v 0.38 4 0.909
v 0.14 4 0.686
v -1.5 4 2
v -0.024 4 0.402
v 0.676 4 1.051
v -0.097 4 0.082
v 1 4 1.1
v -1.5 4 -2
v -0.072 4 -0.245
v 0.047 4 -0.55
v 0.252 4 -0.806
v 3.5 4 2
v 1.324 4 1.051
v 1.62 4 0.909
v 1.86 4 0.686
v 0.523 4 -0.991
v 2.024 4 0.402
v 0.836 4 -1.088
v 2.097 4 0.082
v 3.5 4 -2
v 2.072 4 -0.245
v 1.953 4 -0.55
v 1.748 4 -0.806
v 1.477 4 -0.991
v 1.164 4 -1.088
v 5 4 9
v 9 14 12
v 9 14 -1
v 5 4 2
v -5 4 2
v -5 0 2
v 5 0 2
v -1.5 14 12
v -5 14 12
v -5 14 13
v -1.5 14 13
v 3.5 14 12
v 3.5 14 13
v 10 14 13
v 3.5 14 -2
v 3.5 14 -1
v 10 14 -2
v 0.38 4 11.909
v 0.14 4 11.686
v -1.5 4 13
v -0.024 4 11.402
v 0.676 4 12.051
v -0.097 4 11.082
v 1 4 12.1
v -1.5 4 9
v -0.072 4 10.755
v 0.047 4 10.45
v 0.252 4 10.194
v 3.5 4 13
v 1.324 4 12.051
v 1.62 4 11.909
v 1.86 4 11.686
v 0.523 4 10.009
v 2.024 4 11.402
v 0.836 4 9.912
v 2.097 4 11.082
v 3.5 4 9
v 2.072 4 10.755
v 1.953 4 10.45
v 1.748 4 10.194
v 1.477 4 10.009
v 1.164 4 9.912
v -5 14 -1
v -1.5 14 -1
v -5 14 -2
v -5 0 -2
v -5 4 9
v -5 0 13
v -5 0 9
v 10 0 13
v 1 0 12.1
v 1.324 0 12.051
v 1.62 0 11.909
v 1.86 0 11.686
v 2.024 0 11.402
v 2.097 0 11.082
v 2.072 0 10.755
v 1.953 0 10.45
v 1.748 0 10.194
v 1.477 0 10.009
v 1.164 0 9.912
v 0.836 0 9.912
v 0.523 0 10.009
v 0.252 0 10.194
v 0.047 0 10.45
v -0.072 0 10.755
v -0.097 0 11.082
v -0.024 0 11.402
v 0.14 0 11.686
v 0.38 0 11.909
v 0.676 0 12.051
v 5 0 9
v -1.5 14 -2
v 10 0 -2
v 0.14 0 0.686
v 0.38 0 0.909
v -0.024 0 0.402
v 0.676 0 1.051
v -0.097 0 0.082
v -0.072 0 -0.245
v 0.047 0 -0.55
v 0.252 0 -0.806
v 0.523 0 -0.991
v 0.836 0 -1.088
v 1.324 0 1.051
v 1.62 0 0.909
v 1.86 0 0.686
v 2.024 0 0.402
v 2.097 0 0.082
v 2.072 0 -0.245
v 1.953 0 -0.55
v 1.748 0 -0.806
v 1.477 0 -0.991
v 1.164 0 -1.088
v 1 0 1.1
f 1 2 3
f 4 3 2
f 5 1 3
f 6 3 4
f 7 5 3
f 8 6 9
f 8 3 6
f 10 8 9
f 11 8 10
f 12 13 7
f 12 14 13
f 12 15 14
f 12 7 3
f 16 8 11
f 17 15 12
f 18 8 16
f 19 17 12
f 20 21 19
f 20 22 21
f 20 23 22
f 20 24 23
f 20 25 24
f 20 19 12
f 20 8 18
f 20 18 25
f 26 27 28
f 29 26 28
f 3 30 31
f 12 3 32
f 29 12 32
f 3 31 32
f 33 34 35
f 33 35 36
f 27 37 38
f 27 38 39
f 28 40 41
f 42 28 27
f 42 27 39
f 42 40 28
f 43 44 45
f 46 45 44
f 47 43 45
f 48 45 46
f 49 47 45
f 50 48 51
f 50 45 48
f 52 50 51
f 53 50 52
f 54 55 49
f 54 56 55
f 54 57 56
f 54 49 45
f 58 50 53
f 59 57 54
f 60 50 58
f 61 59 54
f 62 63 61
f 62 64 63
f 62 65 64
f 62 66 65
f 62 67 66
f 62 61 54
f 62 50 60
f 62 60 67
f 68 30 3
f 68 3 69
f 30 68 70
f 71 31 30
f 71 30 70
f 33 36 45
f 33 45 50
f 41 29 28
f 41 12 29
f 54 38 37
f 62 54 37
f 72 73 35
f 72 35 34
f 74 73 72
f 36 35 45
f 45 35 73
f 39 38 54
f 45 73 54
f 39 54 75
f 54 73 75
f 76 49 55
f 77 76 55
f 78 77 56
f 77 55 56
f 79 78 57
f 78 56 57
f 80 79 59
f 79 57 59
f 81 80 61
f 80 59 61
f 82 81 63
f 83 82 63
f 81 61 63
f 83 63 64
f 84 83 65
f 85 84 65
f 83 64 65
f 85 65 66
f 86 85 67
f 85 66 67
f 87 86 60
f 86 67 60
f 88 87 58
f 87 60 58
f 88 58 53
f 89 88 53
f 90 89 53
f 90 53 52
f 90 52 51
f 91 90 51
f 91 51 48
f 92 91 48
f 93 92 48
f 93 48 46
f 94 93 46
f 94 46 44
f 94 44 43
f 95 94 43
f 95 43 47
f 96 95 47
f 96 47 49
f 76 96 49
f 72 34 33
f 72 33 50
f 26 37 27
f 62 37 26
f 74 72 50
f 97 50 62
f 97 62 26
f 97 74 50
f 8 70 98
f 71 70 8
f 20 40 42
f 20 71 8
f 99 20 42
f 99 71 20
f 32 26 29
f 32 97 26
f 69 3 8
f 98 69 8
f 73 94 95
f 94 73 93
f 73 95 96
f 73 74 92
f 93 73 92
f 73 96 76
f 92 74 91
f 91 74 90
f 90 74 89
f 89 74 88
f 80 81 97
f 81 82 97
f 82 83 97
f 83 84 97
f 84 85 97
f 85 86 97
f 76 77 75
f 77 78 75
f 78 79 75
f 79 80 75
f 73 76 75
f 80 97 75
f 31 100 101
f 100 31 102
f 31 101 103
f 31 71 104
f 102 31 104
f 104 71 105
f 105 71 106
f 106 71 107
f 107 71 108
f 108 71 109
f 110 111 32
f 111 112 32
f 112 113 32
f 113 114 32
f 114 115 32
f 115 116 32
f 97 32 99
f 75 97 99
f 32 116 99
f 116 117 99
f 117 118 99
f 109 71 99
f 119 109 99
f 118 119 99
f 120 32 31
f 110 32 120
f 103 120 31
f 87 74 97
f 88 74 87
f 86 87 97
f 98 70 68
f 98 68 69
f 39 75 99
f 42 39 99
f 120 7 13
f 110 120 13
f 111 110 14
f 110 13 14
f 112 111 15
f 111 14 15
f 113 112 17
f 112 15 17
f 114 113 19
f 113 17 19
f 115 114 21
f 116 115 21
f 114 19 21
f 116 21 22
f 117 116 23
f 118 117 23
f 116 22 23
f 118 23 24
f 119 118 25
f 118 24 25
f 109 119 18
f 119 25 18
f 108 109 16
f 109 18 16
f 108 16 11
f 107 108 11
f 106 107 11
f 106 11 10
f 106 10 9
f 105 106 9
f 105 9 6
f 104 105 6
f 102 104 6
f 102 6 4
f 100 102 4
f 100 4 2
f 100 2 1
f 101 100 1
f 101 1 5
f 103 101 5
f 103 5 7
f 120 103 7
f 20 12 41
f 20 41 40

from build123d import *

# Parameters (mm, degrees)
SKETCH_1_W          = 10
SKETCH_1_H          = 4
EXTRUDE_1_DEPTH     = 4
SKETCH_2_W          = 5
SKETCH_2_H          = 11
EXTRUDE_2_DEPTH     = 4
SKETCH_3_W          = 15
SKETCH_3_H          = 4
EXTRUDE_3_DEPTH     = 4
SKETCH_4_R          = 1.1
CUT_EXTRUDE_1_DEPTH = 17.881943016
SKETCH_5_W          = 3.5
SKETCH_5_H          = 4
EXTRUDE_6_DEPTH     = 10
SKETCH_9_W          = 6.5
SKETCH_9_H          = 4
EXTRUDE_7_DEPTH     = 10
SKETCH_11_W         = 5
SKETCH_11_H         = 7
EXTRUDE_8_DEPTH     = 10
CUT_EXTRUDE_3_REACH = 26.29
CHAMFER_2_SIZE      = 10
CHAMFER_2_SIZE2     = 4


with BuildPart() as part:
    # 草图1 → 凸台-拉伸1 (new body)
    with BuildSketch(Plane(origin=(0, 0, 0), x_dir=(1, 0, 0), z_dir=(0, 1, 0))):
        Rectangle(SKETCH_1_W, SKETCH_1_H)
    extrude(amount=EXTRUDE_1_DEPTH)

    # 草图2 → 凸台-拉伸2 (add)
    with BuildSketch(Plane(origin=(0, 4, 0), x_dir=(1, 0, 0), z_dir=(0, 1, 0))):
        with Locations((7.5, -3.5)):
            Rectangle(SKETCH_2_W, SKETCH_2_H)
    extrude(amount=-EXTRUDE_2_DEPTH)

    # 草图3 → 凸台-拉伸3 (add)
    with BuildSketch(Plane(origin=(0, 4, 0), x_dir=(1, 0, 0), z_dir=(0, 1, 0))):
        with Locations((2.5, -11)):
            Rectangle(SKETCH_3_W, SKETCH_3_H)
    extrude(amount=-EXTRUDE_3_DEPTH)

    # 草图4 → 切除-拉伸1 (cut, through all)
    with BuildSketch(Plane(origin=(0, 4, 0), x_dir=(1, 0, 0), z_dir=(0, 1, 0))):
        with Locations(Location((1, -11, 0), (0, 0, 270))):
            Circle(SKETCH_4_R)
        with Locations(Location((1, 0, 0), (0, 0, 270))):
            Circle(SKETCH_4_R)
    extrude(amount=-CUT_EXTRUDE_1_DEPTH, mode=Mode.SUBTRACT)

    # 草图5 → 凸台-拉伸6 (add)
    with BuildSketch(Plane(origin=(0, 4, 0), x_dir=(1, 0, 0), z_dir=(0, 1, 0))):
        with Locations((-3.25, -11)):
            Rectangle(SKETCH_5_W, SKETCH_5_H)
        with Locations((-3.25, 0)):
            Rectangle(SKETCH_5_W, SKETCH_5_H)
    extrude(amount=EXTRUDE_6_DEPTH)

    # 草图9 → 凸台-拉伸7 (add)
    with BuildSketch(Plane(origin=(0, 4, 0), x_dir=(1, 0, 0), z_dir=(0, 1, 0))):
        with Locations((6.75, 0)):
            Rectangle(SKETCH_9_W, SKETCH_9_H)
        with Locations((6.75, -11)):
            Rectangle(SKETCH_9_W, SKETCH_9_H)
    extrude(amount=EXTRUDE_7_DEPTH)

    # 草图11 → 凸台-拉伸8 (add)
    with BuildSketch(Plane(origin=(0, 4, 0), x_dir=(1, 0, 0), z_dir=(0, 1, 0))):
        with Locations((7.5, -5.5)):
            Rectangle(SKETCH_11_W, SKETCH_11_H)
    extrude(amount=EXTRUDE_8_DEPTH)

    # 切除-拉伸3: up to this face of the body (flat: up to its plane)
    cut_extrude_3_end = Plane(part.part.faces().sort_by_distance((5, 7, 5.5))[0])
    # 草图8 → 切除-拉伸3 (cut, up to the picked face)
    with BuildSketch(Plane.ZY.offset(5), mode=Mode.PRIVATE) as cut_extrude_3_sk1:
        Polygon((2, 4), (-1, 14), (2, 14), align=None)
    cut_extrude_3_tool1 = split(extrude(cut_extrude_3_sk1.sketch, amount=-CUT_EXTRUDE_3_REACH, mode=Mode.PRIVATE), bisect_by=cut_extrude_3_end, keep=Keep.BOTH, mode=Mode.PRIVATE)
    # 草图8 → 切除-拉伸3 (cut, up to the picked face)
    with BuildSketch(Plane.ZY.offset(5), mode=Mode.PRIVATE) as cut_extrude_3_sk2:
        Polygon((12, 14), (9, 4), (9, 14), align=None)
    cut_extrude_3_tool2 = split(extrude(cut_extrude_3_sk2.sketch, amount=-CUT_EXTRUDE_3_REACH, mode=Mode.PRIVATE), bisect_by=cut_extrude_3_end, keep=Keep.BOTH, mode=Mode.PRIVATE)
    add(cut_extrude_3_tool1.solids().sort_by(Axis((-5, 10.666667, 1), (1, 0, 0)))[0], mode=Mode.SUBTRACT)
    add(cut_extrude_3_tool2.solids().sort_by(Axis((-5, 10.666667, 10), (1, 0, 0)))[0], mode=Mode.SUBTRACT)

    # 倒角2
    chamfer_2_edges = [part.edges().sort_by_distance(p)[0] for p in [
        (5, 14, 5.5),
    ]]
    chamfer_2_side = [part.faces().sort_by_distance(p)[0] for p in [
        (5, 7.859375, 5.5),
    ]]
    chamfer(chamfer_2_edges, length=CHAMFER_2_SIZE, length2=CHAMFER_2_SIZE2, reference=chamfer_2_side[0])


solid = part.part
